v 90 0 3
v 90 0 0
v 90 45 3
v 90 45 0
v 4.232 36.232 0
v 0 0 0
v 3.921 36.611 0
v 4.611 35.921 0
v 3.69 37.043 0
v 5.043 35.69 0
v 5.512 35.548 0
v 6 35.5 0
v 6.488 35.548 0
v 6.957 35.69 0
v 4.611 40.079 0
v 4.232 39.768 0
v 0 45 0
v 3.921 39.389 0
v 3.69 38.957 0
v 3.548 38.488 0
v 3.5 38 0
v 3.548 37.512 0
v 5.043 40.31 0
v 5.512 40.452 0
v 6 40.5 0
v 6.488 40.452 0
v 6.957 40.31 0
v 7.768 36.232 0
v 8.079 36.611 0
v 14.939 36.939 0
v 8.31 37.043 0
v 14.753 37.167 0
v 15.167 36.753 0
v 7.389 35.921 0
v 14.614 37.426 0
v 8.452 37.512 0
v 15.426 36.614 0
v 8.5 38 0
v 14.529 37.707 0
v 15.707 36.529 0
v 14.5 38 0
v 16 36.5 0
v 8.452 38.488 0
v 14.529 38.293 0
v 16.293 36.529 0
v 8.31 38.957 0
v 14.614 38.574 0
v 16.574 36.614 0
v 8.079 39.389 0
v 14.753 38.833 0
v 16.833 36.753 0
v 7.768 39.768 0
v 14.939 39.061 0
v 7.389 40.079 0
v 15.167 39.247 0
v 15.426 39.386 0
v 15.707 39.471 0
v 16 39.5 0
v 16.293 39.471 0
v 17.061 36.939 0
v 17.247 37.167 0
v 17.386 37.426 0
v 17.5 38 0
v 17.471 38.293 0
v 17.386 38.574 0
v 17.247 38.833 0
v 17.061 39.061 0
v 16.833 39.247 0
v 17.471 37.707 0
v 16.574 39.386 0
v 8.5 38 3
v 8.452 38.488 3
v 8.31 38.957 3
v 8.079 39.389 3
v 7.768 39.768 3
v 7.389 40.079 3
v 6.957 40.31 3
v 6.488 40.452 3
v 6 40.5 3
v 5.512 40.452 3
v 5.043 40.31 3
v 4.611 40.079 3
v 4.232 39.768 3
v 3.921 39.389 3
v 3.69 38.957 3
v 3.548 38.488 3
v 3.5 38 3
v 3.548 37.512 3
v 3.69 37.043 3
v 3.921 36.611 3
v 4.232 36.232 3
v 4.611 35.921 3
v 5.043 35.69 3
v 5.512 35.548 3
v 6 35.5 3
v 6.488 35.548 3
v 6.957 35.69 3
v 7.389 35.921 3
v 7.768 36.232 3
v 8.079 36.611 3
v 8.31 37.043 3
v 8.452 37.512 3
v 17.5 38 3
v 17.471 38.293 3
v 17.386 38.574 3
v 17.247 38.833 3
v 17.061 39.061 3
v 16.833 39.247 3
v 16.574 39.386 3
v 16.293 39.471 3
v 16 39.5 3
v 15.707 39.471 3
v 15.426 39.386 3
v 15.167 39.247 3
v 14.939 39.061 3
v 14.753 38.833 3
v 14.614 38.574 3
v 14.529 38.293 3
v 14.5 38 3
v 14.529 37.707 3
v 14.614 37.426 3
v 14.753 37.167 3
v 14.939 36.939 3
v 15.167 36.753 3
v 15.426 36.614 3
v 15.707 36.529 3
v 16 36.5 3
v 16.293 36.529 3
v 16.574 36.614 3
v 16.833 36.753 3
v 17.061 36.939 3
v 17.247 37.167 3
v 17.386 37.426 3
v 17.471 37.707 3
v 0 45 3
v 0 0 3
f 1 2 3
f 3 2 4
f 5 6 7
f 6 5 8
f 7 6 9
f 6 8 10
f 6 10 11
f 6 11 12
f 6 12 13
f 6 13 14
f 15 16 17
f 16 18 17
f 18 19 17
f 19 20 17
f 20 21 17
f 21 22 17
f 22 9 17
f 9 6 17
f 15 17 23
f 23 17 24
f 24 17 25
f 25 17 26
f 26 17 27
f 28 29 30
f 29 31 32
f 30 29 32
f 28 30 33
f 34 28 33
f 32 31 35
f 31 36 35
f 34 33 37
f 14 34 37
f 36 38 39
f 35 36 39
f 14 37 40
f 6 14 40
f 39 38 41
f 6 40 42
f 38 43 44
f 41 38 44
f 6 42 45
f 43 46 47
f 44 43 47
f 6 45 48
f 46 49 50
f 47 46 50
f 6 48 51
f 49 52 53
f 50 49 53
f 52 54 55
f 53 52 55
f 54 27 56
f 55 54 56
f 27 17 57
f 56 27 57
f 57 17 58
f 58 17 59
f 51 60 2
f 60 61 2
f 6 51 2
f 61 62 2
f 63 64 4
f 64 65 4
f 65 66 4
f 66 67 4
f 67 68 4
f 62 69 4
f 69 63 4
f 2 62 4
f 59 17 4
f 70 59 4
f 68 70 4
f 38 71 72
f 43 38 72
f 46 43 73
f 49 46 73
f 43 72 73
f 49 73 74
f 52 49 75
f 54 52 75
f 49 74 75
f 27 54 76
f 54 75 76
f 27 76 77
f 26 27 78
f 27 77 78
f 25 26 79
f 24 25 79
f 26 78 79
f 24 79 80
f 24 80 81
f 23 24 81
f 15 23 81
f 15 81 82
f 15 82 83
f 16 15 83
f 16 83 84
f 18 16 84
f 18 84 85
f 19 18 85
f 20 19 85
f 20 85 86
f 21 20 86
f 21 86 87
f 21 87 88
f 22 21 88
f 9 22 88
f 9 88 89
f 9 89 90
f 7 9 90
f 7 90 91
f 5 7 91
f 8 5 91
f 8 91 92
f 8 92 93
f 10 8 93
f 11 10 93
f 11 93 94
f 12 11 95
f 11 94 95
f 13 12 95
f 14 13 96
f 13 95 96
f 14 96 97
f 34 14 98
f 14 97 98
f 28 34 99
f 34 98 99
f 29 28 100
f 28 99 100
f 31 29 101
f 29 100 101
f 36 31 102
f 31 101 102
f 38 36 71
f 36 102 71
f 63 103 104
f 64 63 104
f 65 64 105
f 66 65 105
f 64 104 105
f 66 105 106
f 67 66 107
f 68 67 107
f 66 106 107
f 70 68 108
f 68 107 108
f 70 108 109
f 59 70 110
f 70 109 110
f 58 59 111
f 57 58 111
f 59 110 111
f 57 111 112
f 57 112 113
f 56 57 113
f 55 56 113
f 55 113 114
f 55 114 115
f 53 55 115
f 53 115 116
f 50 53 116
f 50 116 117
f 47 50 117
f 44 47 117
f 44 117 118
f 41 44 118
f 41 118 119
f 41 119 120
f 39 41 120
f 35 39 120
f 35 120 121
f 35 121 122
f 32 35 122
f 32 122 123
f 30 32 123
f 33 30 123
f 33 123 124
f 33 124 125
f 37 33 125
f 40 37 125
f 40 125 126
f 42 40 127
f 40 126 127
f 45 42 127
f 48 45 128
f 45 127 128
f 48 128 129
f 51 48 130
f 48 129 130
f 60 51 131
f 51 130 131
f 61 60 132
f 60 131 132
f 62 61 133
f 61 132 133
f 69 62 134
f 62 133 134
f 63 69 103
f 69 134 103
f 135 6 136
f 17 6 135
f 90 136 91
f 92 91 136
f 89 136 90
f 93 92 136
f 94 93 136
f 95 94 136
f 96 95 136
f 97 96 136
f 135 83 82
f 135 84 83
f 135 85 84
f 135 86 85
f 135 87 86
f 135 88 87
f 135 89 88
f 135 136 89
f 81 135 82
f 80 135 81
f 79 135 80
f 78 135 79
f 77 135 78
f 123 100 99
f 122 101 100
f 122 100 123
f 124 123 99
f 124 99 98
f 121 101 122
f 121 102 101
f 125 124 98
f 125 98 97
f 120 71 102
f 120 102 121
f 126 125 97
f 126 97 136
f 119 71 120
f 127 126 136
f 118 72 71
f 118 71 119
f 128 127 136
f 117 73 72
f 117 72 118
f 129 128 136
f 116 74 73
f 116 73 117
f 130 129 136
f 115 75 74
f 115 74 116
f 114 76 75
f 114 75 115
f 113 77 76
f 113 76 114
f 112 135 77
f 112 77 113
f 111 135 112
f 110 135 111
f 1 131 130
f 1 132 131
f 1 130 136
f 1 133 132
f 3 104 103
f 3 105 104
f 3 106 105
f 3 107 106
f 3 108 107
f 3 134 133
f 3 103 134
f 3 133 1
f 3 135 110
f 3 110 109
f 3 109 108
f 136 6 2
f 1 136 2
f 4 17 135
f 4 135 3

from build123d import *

# Parameters (mm, degrees)
SKETCH_1_W      = 90
SKETCH_1_H      = 45
EXTRUDE_1_DEPTH = 3
SKETCH_2_R      = 2.5
DIA_5_DEPTH     = 101.667770413
SKETCH_3_R      = 1.5
DIA_3_DEPTH     = 101.667770413


with BuildPart() as part:
    # 草圖1 → 伸長1 (new body)
    with BuildSketch(Plane.XY):
        with Locations((45, 22.5)):
            Rectangle(SKETCH_1_W, SKETCH_1_H)
    extrude(amount=EXTRUDE_1_DEPTH)

    # 草圖2 → Dia 5 (cut, through all)
    with BuildSketch(Plane.XY.offset(3)):
        with Locations((6, 38)):
            Circle(SKETCH_2_R)
    extrude(amount=-DIA_5_DEPTH, mode=Mode.SUBTRACT)

    # 草圖3 → Dia 3 (cut, through all)
    with BuildSketch(Plane.XY.offset(3)):
        with Locations((16, 38)):
            Circle(SKETCH_3_R)
    extrude(amount=-DIA_3_DEPTH, mode=Mode.SUBTRACT)


solid = part.part
